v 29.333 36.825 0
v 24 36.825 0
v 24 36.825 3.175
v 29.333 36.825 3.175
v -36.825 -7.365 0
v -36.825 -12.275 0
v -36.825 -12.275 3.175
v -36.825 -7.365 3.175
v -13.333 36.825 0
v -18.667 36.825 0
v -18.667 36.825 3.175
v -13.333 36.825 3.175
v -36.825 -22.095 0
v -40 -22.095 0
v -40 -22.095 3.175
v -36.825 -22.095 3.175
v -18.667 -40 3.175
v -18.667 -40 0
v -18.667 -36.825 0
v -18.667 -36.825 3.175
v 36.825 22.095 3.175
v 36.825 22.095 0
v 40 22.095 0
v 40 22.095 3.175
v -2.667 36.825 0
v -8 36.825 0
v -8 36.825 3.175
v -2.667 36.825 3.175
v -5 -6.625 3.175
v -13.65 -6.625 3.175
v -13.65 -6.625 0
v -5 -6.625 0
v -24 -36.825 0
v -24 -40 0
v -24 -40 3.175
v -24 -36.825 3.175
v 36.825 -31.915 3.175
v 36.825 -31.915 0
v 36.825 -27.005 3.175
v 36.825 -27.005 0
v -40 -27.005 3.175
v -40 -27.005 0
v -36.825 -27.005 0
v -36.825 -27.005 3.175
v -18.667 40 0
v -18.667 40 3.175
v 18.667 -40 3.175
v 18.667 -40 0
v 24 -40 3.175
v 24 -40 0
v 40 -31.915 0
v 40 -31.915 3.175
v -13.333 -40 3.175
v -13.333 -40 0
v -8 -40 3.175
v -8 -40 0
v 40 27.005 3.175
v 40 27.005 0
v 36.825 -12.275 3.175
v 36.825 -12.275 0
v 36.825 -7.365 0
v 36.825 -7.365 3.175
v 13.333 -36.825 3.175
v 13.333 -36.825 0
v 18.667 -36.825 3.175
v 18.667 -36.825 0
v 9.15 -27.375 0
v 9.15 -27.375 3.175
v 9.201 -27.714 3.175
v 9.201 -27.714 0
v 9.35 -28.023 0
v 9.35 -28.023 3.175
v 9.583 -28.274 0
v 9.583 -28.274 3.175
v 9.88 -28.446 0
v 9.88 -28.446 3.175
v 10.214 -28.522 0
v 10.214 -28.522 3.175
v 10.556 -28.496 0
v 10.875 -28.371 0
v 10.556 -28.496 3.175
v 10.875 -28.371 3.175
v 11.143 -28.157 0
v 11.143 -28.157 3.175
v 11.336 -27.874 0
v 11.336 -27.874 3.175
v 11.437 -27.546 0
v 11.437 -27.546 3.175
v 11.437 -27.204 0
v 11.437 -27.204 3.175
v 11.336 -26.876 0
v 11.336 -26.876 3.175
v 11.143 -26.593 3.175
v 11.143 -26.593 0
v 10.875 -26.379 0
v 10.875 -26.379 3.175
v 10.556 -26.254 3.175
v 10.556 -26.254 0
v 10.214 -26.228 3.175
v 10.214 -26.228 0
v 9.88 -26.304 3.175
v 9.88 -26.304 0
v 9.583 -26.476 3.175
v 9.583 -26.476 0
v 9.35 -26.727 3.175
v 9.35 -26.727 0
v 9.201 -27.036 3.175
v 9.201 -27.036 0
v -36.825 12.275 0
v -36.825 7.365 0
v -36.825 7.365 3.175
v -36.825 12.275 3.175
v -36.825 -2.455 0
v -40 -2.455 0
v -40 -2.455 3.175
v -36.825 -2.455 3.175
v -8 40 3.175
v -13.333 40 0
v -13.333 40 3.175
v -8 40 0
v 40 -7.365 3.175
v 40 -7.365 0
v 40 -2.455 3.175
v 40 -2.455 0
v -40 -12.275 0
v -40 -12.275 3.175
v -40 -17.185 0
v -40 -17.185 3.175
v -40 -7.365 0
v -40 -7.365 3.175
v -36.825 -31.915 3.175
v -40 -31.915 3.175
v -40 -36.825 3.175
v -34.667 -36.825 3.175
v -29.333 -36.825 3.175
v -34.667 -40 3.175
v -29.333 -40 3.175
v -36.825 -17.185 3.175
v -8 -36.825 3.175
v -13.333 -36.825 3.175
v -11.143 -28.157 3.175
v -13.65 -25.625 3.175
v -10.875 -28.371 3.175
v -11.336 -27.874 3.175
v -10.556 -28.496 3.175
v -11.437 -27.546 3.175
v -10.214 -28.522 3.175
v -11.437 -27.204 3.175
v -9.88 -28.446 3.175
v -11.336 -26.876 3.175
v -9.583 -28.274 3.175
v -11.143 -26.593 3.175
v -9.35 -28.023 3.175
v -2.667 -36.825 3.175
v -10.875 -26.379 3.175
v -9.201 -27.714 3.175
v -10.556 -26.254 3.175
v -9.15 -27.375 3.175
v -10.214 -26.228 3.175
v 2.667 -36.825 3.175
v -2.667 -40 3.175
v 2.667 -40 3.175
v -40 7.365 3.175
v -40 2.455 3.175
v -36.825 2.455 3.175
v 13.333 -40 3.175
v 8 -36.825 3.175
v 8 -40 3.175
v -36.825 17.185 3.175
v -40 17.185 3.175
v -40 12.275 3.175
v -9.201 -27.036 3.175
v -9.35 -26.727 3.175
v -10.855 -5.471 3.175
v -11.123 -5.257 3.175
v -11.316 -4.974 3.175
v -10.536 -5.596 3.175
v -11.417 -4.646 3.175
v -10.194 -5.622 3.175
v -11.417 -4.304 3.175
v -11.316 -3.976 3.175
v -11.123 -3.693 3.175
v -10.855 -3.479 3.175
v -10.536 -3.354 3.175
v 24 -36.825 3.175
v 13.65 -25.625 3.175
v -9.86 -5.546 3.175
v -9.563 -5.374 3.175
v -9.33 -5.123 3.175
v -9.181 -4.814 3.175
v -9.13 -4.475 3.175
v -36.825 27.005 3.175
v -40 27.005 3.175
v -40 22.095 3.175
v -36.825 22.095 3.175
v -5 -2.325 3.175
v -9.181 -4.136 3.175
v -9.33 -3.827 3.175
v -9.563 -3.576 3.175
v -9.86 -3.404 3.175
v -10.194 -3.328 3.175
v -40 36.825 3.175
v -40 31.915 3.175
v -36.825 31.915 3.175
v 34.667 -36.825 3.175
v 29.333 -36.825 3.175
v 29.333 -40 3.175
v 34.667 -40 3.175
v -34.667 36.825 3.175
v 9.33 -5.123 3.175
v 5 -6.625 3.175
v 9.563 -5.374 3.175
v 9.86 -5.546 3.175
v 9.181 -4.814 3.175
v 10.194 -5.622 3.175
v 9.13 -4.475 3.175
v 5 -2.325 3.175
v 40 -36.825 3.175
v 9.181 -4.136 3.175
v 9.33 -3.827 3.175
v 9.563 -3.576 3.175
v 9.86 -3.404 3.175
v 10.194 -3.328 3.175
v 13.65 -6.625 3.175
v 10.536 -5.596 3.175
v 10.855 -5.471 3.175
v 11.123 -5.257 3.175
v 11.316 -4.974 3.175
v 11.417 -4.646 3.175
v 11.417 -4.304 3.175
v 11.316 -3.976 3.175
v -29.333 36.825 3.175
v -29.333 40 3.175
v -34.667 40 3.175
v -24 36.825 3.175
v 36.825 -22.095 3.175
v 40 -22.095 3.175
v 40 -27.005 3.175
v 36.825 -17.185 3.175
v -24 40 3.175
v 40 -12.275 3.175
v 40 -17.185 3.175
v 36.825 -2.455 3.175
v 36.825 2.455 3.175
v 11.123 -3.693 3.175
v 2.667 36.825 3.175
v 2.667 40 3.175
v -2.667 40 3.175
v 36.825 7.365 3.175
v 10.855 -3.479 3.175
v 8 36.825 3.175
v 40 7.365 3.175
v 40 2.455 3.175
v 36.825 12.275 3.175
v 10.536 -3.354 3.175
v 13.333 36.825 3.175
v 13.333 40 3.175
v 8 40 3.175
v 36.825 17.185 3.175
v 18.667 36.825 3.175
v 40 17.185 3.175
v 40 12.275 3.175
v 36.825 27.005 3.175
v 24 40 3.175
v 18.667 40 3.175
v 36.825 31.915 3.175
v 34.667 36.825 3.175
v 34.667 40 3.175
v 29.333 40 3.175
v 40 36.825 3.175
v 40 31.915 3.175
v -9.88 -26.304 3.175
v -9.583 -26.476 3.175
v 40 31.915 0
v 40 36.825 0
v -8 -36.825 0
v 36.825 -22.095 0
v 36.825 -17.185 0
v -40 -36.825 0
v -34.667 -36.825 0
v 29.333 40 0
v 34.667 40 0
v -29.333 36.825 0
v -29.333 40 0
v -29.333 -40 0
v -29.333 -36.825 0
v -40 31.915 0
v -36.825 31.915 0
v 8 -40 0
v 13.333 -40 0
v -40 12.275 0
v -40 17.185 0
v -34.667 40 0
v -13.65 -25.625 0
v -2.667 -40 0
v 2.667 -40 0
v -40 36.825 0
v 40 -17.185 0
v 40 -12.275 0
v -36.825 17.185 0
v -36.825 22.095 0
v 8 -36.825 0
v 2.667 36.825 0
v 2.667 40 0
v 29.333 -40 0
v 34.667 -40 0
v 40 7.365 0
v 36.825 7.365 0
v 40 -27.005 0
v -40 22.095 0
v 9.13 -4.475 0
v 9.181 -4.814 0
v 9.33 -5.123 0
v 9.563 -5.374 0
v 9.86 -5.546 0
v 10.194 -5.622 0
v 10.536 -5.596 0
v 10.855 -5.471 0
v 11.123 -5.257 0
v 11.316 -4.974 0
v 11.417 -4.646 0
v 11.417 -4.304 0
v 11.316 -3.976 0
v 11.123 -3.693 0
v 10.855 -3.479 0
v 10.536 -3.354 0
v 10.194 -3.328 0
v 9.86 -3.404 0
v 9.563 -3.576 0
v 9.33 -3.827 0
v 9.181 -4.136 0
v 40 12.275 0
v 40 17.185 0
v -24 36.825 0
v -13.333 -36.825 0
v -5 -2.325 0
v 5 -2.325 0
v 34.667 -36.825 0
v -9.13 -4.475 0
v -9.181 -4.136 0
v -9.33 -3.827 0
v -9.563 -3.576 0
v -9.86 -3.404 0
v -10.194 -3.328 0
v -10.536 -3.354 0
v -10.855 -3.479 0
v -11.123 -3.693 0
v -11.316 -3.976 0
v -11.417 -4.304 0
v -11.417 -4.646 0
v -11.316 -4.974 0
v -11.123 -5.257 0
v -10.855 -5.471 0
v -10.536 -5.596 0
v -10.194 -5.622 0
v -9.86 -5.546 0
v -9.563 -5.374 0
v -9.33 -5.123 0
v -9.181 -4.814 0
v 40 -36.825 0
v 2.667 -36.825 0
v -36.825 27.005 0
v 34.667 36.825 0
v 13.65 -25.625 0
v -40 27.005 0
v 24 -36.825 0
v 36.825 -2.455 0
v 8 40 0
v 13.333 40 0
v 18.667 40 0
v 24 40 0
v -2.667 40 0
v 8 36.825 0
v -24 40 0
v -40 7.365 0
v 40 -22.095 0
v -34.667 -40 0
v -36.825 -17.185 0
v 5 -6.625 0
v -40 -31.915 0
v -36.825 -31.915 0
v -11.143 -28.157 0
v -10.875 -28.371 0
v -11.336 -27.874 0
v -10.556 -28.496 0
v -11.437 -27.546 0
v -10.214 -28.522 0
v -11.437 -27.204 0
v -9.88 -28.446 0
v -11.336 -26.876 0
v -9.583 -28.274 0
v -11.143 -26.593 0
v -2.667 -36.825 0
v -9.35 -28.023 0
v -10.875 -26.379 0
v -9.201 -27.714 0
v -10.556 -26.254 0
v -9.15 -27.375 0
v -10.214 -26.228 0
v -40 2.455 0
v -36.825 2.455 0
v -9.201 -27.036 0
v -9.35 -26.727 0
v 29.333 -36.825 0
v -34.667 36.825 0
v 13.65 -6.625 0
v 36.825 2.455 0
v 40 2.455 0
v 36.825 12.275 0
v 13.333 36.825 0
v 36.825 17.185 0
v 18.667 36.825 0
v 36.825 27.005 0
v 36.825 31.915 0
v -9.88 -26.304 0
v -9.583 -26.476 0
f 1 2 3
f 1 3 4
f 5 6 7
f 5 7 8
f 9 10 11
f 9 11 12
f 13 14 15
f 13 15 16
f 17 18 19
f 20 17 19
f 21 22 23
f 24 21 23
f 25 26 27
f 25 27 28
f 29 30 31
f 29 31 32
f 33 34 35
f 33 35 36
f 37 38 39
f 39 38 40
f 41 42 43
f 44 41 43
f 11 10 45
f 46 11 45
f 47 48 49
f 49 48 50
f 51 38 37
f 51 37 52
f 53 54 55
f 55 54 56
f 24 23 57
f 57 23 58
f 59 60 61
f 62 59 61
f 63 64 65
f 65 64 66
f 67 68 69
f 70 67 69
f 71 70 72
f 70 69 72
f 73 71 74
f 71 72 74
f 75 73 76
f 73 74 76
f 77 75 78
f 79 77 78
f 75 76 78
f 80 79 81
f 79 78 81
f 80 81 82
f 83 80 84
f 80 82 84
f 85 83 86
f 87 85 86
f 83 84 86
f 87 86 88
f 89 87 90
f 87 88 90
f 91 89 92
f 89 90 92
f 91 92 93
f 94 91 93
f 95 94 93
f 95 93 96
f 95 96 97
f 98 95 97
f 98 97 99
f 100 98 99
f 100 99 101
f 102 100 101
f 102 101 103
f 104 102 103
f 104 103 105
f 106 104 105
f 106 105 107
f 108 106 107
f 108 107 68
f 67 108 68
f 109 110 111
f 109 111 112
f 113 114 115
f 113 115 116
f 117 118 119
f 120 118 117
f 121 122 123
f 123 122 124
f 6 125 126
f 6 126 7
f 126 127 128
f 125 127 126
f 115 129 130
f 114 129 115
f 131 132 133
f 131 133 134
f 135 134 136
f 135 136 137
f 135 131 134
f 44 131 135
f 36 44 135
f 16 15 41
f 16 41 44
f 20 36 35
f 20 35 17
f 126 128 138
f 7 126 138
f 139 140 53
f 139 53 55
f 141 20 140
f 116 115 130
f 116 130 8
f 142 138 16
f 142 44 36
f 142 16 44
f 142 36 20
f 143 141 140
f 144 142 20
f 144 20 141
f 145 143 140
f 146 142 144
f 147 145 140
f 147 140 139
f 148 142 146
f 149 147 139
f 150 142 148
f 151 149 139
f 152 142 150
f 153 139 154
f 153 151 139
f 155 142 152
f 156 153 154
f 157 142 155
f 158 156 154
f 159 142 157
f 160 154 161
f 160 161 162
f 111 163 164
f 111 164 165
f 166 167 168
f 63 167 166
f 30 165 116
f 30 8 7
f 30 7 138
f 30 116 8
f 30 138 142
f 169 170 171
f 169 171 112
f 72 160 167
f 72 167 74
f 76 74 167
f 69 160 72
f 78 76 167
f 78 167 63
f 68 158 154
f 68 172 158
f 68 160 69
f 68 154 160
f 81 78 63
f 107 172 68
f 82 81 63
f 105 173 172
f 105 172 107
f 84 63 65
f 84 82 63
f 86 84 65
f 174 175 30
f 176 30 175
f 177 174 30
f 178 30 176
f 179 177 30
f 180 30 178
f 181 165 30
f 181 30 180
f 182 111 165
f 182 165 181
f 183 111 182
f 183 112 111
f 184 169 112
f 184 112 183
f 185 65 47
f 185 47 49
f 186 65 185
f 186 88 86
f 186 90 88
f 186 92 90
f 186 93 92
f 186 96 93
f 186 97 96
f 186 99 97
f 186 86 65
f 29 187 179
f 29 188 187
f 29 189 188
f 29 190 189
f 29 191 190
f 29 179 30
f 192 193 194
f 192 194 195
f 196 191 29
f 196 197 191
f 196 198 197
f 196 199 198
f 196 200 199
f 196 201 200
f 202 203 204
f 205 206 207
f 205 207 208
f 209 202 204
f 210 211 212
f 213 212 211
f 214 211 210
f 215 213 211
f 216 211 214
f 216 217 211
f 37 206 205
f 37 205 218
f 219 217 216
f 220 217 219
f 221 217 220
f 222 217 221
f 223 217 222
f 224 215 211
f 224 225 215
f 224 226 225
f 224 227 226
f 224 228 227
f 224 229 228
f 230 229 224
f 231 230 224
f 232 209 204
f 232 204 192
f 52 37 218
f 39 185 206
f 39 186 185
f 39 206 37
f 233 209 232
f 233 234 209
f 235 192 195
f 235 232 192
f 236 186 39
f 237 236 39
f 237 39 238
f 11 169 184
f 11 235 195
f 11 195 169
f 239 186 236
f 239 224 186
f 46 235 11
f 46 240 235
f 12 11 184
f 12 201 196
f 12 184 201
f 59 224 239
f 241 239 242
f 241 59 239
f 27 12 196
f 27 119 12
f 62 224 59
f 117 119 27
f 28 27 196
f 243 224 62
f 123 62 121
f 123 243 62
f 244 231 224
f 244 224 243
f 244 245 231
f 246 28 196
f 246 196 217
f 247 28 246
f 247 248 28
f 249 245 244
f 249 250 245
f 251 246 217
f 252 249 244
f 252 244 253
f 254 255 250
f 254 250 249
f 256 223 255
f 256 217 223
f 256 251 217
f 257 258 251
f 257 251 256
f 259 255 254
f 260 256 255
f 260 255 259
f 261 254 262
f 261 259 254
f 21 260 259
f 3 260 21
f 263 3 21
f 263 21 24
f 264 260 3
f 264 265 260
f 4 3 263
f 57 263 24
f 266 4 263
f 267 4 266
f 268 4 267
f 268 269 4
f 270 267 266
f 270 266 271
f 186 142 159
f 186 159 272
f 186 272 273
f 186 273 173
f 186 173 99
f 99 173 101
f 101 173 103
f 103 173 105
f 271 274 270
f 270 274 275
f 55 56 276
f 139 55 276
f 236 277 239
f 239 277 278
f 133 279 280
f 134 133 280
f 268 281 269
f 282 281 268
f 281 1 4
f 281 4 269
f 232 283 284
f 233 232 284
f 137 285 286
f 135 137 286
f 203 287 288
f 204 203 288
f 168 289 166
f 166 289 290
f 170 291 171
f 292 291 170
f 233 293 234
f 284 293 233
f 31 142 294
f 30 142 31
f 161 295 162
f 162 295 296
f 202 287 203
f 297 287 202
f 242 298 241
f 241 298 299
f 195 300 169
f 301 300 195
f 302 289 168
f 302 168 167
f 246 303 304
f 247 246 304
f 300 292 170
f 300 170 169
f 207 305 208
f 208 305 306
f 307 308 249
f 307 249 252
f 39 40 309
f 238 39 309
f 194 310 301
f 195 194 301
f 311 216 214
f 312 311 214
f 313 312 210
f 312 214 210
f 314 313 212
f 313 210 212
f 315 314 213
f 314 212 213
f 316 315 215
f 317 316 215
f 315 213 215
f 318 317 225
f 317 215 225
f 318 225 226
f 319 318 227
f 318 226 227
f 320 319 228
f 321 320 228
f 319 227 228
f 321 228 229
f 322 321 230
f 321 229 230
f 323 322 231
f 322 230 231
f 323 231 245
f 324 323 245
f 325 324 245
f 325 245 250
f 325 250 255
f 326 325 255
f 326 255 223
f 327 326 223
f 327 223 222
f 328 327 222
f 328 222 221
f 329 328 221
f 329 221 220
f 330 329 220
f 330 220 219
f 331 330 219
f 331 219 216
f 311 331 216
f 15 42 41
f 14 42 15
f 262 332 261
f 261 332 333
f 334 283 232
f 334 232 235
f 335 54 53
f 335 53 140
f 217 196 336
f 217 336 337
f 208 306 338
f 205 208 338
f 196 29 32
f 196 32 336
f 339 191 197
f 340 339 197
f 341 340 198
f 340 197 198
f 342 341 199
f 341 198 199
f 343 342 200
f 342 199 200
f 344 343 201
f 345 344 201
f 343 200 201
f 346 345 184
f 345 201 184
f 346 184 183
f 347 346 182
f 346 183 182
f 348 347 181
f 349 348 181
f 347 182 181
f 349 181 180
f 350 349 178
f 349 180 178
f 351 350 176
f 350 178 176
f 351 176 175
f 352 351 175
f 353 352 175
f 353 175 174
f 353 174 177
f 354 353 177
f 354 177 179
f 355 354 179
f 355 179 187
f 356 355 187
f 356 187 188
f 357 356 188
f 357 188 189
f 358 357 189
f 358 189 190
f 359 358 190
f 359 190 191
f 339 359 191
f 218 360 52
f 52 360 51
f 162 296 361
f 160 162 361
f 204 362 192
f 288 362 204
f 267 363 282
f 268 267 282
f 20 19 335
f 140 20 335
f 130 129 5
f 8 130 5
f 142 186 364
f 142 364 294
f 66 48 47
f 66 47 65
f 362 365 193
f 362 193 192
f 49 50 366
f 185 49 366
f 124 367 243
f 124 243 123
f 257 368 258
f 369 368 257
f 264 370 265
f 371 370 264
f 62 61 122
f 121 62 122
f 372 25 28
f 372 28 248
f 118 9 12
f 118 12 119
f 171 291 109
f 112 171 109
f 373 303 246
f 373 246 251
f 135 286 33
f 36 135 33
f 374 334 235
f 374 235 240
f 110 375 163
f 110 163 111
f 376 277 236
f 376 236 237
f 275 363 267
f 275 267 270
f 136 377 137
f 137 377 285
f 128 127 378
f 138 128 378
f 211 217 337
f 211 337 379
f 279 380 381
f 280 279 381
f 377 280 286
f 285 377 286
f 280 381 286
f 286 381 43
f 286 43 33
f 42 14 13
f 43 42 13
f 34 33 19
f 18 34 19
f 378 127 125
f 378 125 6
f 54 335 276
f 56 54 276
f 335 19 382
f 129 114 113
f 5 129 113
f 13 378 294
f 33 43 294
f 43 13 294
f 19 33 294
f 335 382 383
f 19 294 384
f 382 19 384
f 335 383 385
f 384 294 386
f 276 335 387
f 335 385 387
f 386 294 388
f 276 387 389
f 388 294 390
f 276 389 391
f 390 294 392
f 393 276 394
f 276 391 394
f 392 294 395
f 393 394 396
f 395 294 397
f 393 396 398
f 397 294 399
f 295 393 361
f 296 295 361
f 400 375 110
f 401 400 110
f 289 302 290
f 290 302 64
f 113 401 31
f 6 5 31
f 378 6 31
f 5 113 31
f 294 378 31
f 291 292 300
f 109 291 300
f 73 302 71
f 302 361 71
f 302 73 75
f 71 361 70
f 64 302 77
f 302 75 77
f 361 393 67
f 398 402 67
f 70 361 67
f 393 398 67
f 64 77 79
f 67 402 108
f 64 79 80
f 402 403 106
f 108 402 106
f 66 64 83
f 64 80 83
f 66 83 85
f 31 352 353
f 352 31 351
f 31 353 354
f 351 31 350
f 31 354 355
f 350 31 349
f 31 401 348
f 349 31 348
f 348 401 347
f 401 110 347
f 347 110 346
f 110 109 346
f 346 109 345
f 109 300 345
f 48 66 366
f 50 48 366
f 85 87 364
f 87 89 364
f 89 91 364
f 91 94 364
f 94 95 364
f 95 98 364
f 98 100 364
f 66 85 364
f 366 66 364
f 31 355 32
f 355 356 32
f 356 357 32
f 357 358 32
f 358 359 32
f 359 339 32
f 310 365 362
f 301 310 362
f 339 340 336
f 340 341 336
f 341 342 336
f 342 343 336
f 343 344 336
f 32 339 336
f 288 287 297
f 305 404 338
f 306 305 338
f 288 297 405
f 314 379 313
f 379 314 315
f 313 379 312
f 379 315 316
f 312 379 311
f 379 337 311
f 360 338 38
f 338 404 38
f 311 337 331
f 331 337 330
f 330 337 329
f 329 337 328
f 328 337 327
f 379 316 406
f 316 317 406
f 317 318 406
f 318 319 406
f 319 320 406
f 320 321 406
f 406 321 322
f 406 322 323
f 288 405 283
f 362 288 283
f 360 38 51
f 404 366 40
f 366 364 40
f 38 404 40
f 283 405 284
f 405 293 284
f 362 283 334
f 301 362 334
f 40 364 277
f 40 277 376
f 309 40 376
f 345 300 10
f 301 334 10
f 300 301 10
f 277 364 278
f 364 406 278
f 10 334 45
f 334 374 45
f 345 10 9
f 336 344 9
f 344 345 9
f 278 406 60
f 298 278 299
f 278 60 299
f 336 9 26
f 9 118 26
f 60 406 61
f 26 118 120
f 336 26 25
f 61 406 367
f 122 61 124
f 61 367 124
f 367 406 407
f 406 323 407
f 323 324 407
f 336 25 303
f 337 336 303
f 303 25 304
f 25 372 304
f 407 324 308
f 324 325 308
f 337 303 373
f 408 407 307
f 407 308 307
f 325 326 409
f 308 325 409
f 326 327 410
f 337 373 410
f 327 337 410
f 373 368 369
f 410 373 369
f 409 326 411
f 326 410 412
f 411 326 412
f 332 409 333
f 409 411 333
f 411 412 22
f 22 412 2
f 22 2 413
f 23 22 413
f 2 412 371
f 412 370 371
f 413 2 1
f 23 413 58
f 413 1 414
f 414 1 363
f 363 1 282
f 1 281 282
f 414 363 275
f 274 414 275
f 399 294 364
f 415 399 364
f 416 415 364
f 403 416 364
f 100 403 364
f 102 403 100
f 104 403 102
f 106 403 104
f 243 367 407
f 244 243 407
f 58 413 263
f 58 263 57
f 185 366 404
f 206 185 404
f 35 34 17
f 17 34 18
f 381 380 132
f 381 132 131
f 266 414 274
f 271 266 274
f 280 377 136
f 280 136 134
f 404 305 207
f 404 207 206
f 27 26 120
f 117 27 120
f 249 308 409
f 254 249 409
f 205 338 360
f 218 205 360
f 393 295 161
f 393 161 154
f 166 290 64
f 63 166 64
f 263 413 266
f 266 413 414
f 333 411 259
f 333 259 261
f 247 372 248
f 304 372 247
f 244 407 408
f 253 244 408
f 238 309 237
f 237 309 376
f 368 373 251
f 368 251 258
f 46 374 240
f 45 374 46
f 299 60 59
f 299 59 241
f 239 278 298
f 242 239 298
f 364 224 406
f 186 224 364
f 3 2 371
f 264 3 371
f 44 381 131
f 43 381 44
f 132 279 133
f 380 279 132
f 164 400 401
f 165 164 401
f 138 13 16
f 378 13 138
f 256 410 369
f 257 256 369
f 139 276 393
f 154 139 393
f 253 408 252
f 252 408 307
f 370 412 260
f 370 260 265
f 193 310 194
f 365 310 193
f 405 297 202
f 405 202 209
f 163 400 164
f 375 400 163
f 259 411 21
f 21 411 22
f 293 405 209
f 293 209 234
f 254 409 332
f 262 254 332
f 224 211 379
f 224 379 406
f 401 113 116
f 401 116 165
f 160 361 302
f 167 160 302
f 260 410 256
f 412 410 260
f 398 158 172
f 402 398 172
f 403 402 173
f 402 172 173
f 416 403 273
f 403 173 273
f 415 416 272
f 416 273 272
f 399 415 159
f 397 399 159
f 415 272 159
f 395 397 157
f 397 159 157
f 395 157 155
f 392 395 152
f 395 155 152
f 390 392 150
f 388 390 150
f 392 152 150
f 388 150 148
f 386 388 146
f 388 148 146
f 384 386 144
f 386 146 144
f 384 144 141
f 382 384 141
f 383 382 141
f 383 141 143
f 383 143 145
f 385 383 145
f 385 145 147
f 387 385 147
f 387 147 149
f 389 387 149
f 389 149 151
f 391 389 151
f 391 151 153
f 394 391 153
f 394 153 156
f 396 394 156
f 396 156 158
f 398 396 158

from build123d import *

# Parameters (mm, degrees)
SKETCH1_W               = 80
SKETCH1_H               = 80
BOSS_EXTRUDE1_DEPTH     = 3.175
CUT_EXTRUDE2_DEPTH      = 57.657573413
CUT_EXTRUDE2_DEPTH_BACK = 57.657573413
SKETCH3_W               = 5.333333333
SKETCH3_H               = 3.175
SKETCH3_W_2             = 3.175
SKETCH3_H_2             = 4.91
SKETCH3_W_3             = 5.333333334
SKETCH4_R               = 1.15
CUT_EXTRUDE3_DEPTH      = 57.657573413


with BuildPart() as part:
    # Sketch1 → Boss-Extrude1 (new body)
    with BuildSketch(Plane.XY):
        Rectangle(SKETCH1_W, SKETCH1_H)
    extrude(amount=BOSS_EXTRUDE1_DEPTH)

    # Sketch3 → Cut-Extrude2 (cut, two sides: drawn at the far end of the back side and taken through both)
    with BuildSketch(Plane.XY.offset(3.175).offset(-CUT_EXTRUDE2_DEPTH_BACK)):
        with Locations((-37.333333334, -38.4125)):
            Rectangle(SKETCH3_W, SKETCH3_H)
        with Locations((-26.666666666, -38.4125)):
            Rectangle(SKETCH3_W, SKETCH3_H)
        with Locations((-38.4125, -29.46)):
            Rectangle(SKETCH3_W_2, SKETCH3_H_2)
        with Locations((-16, -38.4125)):
            Rectangle(SKETCH3_W_3, SKETCH3_H)
        with Locations((-38.4125, -19.64)):
            Rectangle(SKETCH3_W_2, SKETCH3_H_2)
        with Locations((-5.333333334, -38.4125)):
            Rectangle(SKETCH3_W, SKETCH3_H)
        with Locations((-38.4125, -9.82)):
            Rectangle(SKETCH3_W_2, SKETCH3_H_2)
        with Locations((5.333333334, -38.4125)):
            Rectangle(SKETCH3_W, SKETCH3_H)
        with Locations((-38.4125, 0)):
            Rectangle(SKETCH3_W_2, SKETCH3_H_2)
        with Locations((16, -38.4125)):
            Rectangle(SKETCH3_W_3, SKETCH3_H)
        with Locations((-38.4125, 9.82)):
            Rectangle(SKETCH3_W_2, SKETCH3_H_2)
        with Locations((26.666666666, -38.4125)):
            Rectangle(SKETCH3_W, SKETCH3_H)
        with Locations((-38.4125, 19.64)):
            Rectangle(SKETCH3_W_2, SKETCH3_H_2)
        with Locations((37.333333334, -38.4125)):
            Rectangle(SKETCH3_W, SKETCH3_H)
        with Locations((-38.4125, 29.46)):
            Rectangle(SKETCH3_W_2, SKETCH3_H_2)
        with Locations((-37.333333334, 38.4125)):
            Rectangle(SKETCH3_W, SKETCH3_H)
        with Locations((38.4125, -29.46)):
            Rectangle(SKETCH3_W_2, SKETCH3_H_2)
        with Locations((38.4125, -19.64)):
            Rectangle(SKETCH3_W_2, SKETCH3_H_2)
        with Locations((-26.666666666, 38.4125)):
            Rectangle(SKETCH3_W, SKETCH3_H)
        with Locations((38.4125, -9.82)):
            Rectangle(SKETCH3_W_2, SKETCH3_H_2)
        with Locations((-16, 38.4125)):
            Rectangle(SKETCH3_W_3, SKETCH3_H)
        with Locations((38.4125, 0)):
            Rectangle(SKETCH3_W_2, SKETCH3_H_2)
        with Locations((-5.333333334, 38.4125)):
            Rectangle(SKETCH3_W, SKETCH3_H)
        with Locations((38.4125, 9.82)):
            Rectangle(SKETCH3_W_2, SKETCH3_H_2)
        with Locations((5.333333334, 38.4125)):
            Rectangle(SKETCH3_W, SKETCH3_H)
        with Locations((38.4125, 19.64)):
            Rectangle(SKETCH3_W_2, SKETCH3_H_2)
        with Locations((16, 38.4125)):
            Rectangle(SKETCH3_W_3, SKETCH3_H)
        with Locations((38.4125, 29.46)):
            Rectangle(SKETCH3_W_2, SKETCH3_H_2)
        with Locations((26.666666666, 38.4125)):
            Rectangle(SKETCH3_W, SKETCH3_H)
        with Locations((37.333333334, 38.4125)):
            Rectangle(SKETCH3_W, SKETCH3_H)
    extrude(amount=CUT_EXTRUDE2_DEPTH + CUT_EXTRUDE2_DEPTH_BACK, mode=Mode.SUBTRACT)

    # Sketch4 → Cut-Extrude3 (cut, through all)
    with BuildSketch(Plane.XY.offset(3.175)):
        with Locations((-10.28, -4.475)):
            Circle(SKETCH4_R)
        with Locations((-10.3, -27.375)):
            Circle(SKETCH4_R)
        with Locations(Location((10.3, -27.375, 0), (0, 0, 180))):
            Circle(SKETCH4_R)
        with Locations(Location((10.28, -4.475, 0), (0, 0, 180))):
            Circle(SKETCH4_R)
        Polygon((5, -2.325), (5, -6.625), (13.65, -6.625), (13.65, -25.625), (-13.65, -25.625), (-13.65, -6.625), (-5, -6.625), (-5, -2.325), align=None)
    extrude(amount=-CUT_EXTRUDE3_DEPTH, mode=Mode.SUBTRACT)


solid = part.part
